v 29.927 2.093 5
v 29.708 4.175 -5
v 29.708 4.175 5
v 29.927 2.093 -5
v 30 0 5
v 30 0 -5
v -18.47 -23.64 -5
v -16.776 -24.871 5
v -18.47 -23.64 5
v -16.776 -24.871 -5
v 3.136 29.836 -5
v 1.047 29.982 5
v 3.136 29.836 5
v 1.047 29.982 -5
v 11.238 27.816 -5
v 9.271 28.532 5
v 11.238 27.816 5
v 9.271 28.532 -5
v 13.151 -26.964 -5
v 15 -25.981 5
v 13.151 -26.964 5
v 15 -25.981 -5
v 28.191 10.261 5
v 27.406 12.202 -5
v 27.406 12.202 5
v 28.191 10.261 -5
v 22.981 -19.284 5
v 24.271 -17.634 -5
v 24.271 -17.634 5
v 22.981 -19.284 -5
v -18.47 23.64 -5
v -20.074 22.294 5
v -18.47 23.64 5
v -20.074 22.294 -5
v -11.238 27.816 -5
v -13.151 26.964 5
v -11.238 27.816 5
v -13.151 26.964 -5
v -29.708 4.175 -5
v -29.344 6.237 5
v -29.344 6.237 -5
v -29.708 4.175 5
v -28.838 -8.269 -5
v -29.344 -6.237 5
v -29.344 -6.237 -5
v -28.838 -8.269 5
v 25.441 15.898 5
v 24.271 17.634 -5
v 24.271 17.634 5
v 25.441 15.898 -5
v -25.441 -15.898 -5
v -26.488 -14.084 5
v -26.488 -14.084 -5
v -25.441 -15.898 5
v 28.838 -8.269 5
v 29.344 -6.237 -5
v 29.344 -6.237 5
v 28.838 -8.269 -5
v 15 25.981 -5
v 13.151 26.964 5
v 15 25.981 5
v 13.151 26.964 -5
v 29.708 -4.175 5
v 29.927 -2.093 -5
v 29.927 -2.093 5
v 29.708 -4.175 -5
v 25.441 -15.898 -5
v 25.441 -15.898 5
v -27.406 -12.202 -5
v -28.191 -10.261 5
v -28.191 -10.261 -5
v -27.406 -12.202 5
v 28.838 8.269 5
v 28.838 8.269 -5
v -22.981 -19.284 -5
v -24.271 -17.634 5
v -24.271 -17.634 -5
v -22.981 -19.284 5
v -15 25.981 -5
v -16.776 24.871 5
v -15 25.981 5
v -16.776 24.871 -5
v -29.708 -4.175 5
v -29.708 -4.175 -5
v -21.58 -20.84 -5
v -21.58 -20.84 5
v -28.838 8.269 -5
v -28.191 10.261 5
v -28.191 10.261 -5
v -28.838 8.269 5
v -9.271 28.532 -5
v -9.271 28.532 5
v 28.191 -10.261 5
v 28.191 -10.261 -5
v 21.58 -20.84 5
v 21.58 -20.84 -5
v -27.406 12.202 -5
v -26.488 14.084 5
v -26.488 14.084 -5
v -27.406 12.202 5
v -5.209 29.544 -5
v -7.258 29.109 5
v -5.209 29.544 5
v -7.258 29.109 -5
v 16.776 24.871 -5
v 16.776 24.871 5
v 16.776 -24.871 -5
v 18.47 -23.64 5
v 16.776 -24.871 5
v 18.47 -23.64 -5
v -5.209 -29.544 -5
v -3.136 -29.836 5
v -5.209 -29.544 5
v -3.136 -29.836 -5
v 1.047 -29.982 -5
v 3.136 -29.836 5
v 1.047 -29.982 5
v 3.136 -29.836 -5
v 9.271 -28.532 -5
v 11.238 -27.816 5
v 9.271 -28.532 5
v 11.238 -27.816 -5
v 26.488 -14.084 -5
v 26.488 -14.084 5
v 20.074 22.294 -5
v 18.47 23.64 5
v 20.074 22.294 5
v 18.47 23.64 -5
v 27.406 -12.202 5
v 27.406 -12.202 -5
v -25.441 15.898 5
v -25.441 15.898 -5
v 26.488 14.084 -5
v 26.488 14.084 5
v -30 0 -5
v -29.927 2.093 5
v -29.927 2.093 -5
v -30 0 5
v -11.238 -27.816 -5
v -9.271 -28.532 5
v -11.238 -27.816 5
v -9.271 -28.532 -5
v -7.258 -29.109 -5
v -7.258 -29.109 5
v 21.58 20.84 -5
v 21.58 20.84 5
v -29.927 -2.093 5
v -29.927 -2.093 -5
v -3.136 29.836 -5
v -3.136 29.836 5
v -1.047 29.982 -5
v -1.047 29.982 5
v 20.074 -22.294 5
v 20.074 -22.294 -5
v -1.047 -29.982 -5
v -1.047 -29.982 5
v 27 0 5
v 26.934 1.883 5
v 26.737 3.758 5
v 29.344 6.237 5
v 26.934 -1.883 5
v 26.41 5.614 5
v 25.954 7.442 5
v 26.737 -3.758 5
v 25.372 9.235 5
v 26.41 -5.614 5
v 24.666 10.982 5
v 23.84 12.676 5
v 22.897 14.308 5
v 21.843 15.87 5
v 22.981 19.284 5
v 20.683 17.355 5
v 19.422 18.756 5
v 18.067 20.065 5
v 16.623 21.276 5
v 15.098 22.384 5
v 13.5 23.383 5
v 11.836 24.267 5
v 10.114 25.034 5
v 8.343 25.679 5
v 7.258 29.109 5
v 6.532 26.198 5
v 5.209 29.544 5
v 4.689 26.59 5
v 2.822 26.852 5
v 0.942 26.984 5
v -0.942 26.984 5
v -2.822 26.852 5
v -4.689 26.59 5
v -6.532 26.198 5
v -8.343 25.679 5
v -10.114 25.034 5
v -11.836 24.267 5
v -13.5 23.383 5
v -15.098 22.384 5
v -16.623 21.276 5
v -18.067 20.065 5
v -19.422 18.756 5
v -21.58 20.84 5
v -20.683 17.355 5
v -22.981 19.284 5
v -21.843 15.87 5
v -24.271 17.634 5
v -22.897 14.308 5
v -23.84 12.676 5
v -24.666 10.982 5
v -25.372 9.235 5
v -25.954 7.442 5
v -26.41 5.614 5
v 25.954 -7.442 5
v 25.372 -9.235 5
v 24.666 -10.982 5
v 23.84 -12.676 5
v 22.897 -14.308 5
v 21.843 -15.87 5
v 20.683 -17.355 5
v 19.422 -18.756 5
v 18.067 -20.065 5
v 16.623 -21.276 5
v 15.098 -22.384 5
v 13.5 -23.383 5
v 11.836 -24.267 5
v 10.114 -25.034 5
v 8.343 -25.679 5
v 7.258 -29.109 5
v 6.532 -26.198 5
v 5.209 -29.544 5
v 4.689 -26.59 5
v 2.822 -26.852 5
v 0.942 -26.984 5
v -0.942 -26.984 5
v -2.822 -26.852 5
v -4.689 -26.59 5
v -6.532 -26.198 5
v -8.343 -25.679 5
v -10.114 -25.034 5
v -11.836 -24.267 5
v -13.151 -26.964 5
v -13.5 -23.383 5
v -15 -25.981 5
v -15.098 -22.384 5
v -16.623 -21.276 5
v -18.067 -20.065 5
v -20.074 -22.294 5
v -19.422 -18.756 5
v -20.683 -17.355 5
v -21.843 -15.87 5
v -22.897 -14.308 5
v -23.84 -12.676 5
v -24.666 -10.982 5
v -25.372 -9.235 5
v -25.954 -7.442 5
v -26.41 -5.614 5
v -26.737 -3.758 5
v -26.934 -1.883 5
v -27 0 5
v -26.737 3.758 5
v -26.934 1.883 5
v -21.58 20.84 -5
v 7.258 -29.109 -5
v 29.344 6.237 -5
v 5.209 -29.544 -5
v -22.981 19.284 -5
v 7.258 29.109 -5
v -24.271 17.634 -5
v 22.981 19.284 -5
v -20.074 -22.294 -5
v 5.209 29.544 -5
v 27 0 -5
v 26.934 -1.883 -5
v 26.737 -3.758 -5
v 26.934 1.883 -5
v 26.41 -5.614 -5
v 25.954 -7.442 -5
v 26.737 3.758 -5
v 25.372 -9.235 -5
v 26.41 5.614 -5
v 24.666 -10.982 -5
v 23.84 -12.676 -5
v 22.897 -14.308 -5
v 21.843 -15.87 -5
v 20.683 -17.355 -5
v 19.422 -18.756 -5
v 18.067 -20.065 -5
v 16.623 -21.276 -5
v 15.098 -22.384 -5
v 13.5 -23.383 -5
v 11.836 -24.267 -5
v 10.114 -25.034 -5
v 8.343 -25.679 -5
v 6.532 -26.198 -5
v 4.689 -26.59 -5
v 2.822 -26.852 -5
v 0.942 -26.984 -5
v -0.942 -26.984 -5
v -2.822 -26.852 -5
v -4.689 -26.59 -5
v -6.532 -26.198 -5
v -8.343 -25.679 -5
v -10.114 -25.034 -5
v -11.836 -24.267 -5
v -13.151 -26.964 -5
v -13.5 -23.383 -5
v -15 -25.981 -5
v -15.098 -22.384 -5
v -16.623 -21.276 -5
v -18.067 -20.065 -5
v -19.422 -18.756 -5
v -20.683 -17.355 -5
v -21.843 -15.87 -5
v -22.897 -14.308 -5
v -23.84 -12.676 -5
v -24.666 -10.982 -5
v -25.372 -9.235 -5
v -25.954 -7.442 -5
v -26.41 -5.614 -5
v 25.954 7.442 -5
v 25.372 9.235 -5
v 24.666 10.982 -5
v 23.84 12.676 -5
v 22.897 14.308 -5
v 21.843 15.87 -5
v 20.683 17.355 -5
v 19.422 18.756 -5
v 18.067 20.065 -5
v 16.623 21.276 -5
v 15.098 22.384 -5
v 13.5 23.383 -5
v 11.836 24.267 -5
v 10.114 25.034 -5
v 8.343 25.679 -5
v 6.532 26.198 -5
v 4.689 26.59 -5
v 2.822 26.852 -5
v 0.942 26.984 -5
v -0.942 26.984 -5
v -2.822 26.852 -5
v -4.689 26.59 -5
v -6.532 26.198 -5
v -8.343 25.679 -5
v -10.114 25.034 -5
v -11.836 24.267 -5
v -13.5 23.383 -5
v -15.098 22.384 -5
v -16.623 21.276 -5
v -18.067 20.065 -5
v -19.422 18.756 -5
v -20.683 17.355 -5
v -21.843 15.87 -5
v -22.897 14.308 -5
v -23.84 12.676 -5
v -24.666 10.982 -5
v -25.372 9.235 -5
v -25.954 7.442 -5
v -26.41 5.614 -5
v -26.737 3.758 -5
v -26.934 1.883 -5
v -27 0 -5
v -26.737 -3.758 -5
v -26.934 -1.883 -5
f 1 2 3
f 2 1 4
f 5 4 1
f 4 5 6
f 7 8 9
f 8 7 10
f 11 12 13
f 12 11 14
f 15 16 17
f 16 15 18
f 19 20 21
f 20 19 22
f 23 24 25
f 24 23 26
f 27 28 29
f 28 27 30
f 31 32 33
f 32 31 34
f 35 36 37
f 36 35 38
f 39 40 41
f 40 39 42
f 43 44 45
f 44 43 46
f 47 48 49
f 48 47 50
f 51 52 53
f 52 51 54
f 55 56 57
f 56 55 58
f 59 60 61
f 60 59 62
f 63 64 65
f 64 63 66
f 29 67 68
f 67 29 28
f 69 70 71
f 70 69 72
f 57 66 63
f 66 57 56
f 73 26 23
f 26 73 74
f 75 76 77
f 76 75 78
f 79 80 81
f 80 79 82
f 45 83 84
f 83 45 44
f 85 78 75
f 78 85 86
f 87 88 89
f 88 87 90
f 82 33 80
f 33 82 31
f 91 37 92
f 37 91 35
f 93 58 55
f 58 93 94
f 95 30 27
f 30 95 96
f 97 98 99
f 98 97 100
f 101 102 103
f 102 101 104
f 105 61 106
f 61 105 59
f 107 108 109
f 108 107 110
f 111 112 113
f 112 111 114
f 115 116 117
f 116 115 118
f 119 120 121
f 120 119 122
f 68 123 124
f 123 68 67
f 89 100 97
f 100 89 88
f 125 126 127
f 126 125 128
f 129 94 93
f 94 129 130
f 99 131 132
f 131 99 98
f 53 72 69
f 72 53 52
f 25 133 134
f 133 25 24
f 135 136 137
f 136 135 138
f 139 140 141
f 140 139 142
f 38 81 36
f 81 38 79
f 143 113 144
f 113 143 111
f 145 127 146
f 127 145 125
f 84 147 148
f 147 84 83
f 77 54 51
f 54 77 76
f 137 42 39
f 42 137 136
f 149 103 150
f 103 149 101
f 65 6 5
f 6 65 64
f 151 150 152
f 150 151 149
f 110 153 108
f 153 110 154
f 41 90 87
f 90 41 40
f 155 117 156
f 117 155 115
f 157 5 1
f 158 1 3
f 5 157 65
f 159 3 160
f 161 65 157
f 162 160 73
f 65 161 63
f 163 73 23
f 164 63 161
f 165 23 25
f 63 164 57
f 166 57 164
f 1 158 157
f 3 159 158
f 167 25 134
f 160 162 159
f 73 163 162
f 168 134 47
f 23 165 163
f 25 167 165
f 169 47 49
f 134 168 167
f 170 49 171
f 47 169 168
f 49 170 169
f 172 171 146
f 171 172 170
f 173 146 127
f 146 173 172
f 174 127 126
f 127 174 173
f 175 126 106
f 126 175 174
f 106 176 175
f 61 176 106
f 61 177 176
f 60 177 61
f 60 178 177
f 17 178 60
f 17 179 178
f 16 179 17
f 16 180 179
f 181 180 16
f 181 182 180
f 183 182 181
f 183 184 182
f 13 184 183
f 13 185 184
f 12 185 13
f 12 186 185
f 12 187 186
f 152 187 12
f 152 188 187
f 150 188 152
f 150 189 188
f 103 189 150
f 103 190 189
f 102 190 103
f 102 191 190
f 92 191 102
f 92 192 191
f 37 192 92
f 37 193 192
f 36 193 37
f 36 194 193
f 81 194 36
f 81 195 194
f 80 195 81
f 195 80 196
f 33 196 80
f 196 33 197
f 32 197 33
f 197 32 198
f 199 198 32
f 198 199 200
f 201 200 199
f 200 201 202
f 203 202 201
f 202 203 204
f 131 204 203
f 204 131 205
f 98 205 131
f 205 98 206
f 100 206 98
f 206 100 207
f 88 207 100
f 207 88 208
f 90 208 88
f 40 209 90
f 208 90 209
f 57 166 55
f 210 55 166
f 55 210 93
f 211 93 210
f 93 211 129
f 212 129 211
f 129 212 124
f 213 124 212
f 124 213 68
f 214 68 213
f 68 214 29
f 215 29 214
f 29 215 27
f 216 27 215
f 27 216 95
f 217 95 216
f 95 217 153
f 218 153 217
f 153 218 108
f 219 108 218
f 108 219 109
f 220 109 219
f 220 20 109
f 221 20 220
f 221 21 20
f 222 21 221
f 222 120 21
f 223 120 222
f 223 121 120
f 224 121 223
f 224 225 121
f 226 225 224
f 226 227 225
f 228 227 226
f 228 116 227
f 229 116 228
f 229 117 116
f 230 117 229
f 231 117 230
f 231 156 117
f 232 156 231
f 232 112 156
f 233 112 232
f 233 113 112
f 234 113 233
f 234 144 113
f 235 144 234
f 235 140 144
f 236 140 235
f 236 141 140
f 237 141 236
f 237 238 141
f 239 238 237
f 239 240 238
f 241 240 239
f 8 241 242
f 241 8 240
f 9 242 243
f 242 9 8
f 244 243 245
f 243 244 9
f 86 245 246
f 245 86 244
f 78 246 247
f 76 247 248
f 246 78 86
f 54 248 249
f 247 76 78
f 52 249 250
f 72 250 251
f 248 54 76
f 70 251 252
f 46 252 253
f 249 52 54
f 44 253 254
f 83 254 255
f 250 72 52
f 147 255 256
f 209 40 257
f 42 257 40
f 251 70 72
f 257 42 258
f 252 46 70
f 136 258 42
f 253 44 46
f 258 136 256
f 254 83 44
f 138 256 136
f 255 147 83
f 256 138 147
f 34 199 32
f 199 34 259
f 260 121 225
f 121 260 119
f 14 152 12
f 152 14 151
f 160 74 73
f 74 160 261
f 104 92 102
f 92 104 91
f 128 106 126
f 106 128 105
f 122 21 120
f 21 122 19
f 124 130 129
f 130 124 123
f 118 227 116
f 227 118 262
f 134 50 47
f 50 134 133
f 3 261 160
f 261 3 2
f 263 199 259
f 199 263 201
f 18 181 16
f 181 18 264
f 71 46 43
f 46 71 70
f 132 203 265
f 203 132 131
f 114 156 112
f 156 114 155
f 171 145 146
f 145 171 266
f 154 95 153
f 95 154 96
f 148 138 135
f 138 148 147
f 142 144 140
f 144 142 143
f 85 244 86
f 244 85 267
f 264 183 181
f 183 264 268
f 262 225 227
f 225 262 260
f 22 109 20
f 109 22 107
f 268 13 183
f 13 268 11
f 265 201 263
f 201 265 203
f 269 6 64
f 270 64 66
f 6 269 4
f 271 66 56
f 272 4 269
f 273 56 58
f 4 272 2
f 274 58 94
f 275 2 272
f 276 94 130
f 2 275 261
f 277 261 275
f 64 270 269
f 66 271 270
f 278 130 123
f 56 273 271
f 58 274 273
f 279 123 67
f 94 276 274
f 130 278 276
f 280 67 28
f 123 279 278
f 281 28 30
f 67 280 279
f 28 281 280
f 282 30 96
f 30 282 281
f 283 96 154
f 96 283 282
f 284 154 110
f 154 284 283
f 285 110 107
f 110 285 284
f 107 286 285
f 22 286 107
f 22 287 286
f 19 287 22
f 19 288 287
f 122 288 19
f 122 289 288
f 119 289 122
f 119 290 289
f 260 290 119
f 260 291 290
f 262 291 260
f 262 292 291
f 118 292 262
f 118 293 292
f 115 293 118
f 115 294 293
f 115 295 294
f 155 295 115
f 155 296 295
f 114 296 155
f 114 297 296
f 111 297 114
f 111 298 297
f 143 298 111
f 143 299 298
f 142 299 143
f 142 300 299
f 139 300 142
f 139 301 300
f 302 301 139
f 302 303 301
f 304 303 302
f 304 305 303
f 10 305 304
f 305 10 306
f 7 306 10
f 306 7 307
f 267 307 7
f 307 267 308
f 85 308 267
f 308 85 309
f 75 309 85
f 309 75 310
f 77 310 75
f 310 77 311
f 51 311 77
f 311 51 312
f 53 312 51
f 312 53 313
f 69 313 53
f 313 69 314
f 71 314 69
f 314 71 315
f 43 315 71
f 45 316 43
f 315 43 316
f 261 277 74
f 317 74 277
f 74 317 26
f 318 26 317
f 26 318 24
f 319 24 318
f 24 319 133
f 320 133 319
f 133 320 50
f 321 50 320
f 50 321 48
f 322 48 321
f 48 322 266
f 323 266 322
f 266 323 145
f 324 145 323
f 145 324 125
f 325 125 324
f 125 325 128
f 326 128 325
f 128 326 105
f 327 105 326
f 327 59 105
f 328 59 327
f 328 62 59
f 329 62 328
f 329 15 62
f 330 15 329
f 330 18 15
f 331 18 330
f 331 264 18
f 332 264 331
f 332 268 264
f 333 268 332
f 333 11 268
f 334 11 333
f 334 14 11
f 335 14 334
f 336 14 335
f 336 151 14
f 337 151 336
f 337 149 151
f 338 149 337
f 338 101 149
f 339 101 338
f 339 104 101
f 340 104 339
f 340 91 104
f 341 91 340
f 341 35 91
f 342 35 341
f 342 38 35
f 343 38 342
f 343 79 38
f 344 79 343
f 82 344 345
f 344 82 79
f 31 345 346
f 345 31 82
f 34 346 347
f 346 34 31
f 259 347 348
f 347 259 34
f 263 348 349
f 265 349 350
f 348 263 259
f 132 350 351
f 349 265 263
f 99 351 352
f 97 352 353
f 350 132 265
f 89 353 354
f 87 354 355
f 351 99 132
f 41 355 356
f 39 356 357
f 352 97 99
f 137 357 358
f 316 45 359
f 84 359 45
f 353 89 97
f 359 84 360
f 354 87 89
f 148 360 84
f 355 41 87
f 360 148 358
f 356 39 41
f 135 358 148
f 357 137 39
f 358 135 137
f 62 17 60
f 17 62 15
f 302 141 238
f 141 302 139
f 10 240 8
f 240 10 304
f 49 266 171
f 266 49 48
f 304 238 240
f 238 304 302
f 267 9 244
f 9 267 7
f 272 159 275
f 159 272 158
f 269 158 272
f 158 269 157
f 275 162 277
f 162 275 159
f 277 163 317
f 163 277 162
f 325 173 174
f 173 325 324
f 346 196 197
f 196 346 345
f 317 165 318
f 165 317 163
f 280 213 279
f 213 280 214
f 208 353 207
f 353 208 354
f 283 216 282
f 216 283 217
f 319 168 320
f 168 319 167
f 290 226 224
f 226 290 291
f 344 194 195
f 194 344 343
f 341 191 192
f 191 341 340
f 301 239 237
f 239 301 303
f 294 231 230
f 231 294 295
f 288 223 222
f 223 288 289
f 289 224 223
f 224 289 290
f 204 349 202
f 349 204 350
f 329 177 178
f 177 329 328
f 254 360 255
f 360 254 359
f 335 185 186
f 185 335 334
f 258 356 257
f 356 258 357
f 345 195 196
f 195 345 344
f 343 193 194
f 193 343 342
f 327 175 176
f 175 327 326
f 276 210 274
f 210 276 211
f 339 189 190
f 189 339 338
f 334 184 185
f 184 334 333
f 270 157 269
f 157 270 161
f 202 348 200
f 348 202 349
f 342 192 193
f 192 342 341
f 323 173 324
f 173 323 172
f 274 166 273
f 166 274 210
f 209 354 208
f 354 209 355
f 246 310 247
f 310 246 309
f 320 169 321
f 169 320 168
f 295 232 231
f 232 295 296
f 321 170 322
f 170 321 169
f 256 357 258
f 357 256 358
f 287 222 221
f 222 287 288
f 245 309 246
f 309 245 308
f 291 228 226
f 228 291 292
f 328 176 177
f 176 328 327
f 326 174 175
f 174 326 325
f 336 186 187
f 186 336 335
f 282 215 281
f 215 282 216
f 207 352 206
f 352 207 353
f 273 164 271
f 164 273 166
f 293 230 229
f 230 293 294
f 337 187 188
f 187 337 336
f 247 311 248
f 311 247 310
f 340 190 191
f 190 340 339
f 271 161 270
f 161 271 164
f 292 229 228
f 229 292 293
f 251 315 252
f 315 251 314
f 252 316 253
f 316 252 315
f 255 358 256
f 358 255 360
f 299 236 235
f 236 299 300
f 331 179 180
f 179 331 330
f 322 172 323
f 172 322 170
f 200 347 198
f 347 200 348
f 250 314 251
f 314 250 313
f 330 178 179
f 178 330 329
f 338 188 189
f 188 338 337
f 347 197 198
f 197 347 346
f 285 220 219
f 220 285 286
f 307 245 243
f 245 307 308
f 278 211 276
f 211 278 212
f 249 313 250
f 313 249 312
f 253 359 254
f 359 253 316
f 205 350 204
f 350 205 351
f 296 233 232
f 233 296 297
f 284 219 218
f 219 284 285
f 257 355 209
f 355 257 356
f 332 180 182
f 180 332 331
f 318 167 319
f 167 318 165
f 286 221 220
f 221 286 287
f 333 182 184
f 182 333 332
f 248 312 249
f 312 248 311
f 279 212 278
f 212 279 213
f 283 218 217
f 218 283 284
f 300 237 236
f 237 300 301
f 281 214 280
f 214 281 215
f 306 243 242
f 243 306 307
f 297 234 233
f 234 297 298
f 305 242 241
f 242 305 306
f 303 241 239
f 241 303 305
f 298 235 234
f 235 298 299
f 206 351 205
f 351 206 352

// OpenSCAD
// Filename : Ring.scad
// Version  : v1.0
// Modified : 2 Sept 2016
// Author   : Jason Yeo
//////////////////////////////////////
// Basic ring
//////////////////////////////////////
$fn=90;

ring();

module ring(diameter=30)
{
    difference()
    {
        cylinder(10, diameter, diameter, true);
        translate([0,0,0]) cylinder(12, diameter-3, diameter-3, true);
    }
}
